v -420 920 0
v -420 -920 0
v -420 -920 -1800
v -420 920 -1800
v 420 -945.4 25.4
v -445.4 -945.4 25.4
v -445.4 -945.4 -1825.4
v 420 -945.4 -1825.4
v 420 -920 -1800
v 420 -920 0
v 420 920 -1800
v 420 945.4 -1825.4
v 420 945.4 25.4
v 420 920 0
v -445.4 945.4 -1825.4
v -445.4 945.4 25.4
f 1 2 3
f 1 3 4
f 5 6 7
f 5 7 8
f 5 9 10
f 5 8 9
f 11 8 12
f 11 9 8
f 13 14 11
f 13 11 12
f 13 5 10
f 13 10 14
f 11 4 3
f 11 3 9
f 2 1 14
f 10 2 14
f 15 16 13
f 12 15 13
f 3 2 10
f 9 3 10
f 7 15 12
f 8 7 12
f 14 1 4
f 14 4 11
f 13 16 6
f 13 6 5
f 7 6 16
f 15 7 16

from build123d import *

# Parameters (mm, degrees)
F0_W     = 840
F0_H     = 1840
F1_DEPTH = 1800
F2_T     = 25.4


with BuildPart() as f1:
    # F0 (on Top) → F1 (new body)
    with BuildSketch(Plane.XY):
        Rectangle(F0_W, F0_H)
    extrude(amount=-F1_DEPTH)

    # F2
    f2_openings = [f1.faces().sort_by_distance(p)[0] for p in [
        (420, 0, -900),
    ]]
    offset(amount=F2_T, openings=f2_openings, kind=Kind.INTERSECTION)


solid = f1.part
